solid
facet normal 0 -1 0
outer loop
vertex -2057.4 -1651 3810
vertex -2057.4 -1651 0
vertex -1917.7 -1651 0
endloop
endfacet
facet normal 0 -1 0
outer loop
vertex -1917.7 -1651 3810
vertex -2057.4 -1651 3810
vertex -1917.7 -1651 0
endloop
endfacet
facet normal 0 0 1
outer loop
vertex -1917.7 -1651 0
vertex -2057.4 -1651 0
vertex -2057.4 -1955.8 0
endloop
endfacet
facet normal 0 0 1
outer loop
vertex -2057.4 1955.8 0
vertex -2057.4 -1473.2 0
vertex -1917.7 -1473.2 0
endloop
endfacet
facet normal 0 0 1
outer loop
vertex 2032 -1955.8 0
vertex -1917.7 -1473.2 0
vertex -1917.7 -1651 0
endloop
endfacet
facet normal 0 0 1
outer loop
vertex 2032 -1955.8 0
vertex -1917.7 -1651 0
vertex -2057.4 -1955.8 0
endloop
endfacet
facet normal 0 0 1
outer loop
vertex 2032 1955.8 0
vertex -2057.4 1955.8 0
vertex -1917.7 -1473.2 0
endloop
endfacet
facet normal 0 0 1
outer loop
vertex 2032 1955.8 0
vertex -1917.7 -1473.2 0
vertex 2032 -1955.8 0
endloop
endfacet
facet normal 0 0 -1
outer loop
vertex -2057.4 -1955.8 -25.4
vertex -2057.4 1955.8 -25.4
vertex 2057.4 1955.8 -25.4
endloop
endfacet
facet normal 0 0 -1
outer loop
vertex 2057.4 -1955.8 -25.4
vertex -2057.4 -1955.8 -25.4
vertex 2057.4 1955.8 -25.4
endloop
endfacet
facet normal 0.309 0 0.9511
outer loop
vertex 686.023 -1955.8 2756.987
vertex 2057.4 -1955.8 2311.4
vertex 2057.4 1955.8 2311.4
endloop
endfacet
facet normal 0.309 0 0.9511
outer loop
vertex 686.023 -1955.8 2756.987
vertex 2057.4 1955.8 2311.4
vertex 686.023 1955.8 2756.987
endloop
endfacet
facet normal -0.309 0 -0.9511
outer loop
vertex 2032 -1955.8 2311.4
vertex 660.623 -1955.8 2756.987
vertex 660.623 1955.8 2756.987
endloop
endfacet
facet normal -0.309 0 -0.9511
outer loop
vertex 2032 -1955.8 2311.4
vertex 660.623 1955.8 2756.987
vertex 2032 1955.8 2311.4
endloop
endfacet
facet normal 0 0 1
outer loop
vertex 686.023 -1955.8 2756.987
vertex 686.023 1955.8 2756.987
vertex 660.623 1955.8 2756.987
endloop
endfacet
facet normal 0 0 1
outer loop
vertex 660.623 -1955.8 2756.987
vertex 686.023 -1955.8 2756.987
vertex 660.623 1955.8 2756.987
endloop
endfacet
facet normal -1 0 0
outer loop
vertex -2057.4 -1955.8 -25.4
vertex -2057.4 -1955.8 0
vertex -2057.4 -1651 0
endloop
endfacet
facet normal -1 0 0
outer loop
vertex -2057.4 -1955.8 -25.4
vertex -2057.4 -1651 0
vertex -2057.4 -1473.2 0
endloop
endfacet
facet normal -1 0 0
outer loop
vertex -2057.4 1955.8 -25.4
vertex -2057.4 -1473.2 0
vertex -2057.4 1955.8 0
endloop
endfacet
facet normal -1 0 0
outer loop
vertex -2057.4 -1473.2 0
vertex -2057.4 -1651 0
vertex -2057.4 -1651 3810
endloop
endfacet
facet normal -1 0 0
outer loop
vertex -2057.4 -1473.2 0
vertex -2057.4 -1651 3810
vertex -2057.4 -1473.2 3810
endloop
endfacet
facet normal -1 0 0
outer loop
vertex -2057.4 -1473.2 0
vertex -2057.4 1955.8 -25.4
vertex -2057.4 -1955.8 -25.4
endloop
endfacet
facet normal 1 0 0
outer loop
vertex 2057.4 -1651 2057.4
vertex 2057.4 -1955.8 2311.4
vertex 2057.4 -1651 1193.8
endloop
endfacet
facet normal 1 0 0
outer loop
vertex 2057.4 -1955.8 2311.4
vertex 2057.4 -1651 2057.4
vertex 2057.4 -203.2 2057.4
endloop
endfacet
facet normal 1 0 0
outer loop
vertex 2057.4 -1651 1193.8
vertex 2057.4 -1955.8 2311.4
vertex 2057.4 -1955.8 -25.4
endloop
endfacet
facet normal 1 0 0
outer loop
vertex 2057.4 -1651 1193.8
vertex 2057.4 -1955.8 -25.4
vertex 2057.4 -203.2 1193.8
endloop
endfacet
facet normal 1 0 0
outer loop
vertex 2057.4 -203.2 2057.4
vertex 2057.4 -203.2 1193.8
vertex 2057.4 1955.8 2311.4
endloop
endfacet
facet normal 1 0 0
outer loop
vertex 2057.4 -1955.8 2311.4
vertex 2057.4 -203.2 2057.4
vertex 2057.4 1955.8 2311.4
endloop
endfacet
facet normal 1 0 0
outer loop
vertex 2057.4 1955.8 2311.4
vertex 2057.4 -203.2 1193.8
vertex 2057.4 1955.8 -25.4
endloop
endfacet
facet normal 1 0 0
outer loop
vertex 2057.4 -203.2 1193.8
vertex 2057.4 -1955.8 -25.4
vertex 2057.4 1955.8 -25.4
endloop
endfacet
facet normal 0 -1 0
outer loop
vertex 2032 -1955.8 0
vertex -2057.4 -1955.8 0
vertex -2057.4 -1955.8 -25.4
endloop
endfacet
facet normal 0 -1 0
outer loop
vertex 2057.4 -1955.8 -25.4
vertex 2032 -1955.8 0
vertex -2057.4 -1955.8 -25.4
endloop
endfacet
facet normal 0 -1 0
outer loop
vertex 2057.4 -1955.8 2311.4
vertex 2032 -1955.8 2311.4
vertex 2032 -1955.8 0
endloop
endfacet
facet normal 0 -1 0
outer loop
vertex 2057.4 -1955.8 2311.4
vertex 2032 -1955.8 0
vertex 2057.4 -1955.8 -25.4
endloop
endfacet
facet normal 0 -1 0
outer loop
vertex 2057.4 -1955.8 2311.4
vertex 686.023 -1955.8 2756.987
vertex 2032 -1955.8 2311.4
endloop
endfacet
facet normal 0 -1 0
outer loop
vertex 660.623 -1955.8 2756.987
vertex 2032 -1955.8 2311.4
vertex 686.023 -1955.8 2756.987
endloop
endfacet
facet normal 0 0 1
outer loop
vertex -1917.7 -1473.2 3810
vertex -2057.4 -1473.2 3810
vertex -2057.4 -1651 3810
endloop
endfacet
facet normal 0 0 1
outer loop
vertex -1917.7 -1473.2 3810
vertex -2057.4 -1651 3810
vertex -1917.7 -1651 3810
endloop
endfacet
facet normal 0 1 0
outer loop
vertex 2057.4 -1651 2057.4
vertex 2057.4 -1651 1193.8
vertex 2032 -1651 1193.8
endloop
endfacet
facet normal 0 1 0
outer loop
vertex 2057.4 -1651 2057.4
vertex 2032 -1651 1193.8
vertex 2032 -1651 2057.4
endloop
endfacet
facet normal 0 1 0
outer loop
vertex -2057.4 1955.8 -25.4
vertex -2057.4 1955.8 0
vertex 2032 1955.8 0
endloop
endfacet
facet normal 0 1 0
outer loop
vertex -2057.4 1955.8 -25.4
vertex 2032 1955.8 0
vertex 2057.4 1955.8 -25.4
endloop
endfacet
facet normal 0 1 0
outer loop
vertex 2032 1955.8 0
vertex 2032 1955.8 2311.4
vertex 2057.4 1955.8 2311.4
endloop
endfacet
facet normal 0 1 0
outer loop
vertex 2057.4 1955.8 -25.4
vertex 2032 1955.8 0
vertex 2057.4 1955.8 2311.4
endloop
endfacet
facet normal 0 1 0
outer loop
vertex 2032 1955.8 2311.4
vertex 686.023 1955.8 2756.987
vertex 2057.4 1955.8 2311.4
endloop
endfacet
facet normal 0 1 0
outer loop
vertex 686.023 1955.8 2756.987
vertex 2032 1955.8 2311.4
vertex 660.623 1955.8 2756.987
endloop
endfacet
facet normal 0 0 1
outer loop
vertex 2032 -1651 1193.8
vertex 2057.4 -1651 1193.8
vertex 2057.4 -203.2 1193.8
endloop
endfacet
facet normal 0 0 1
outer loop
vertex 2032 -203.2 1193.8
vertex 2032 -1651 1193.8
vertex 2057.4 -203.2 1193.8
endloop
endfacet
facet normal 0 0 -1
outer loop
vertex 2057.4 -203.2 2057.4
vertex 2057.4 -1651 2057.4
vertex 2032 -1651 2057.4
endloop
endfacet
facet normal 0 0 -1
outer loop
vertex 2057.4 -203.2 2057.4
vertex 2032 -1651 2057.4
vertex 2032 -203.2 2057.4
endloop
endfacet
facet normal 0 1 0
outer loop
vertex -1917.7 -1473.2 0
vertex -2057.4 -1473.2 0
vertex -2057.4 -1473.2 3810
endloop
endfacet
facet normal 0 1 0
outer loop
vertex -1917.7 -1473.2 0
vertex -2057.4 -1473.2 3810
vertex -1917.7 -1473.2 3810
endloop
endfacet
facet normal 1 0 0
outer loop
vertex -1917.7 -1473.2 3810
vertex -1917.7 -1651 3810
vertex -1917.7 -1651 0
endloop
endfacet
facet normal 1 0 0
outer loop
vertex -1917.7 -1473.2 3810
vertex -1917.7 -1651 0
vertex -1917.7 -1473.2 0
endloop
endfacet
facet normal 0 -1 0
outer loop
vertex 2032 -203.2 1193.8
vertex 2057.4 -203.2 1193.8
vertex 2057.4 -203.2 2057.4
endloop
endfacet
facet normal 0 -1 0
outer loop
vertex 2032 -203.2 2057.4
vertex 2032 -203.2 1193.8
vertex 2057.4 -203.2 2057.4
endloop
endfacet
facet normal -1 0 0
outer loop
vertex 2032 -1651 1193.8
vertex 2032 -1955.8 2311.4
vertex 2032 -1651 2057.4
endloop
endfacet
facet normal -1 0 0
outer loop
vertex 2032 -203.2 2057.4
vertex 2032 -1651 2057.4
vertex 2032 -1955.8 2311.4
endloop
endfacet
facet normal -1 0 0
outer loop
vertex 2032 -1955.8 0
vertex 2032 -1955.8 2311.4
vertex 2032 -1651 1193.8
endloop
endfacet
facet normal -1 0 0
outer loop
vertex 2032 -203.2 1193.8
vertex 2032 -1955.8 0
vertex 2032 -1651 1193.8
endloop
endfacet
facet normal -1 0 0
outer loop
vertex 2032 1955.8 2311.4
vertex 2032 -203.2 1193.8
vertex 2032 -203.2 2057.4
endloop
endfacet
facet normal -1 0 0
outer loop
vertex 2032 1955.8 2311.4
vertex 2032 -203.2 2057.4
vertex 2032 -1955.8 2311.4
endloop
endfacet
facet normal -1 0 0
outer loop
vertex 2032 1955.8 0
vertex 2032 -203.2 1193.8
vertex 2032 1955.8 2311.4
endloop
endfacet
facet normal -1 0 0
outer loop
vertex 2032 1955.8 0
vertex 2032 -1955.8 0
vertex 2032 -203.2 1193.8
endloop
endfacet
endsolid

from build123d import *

# Parameters (mm, degrees)
F0_W     = 4114.8
F0_H     = 3911.6
F1_DEPTH = 25.4
F2_W     = 25.4
F2_H     = 3911.6
F3_DEPTH = 2311.4
F4_W     = 1447.8
F4_H     = 863.6
F5_DEPTH = 25.4
F6_W     = 139.7
F6_H     = 177.8
F7_DEPTH = 3810
F9_DEPTH = 3911.6


with BuildPart() as f1:
    # F0 (on Top) → F1 (new body)
    with BuildSketch(Plane.XY):
        Rectangle(F0_W, F0_H)
    extrude(amount=-F1_DEPTH)

    # F2 (on face) → F3 (join)
    with BuildSketch(Plane.XY):
        with Locations((2044.7, 0)):
            Rectangle(F2_W, F2_H)
    extrude(amount=F3_DEPTH)

    # F4 (on face) → F5 (cut)
    with BuildSketch(Plane.YZ.offset(2057.4)):
        with Locations((-927.1, 1625.6)):
            Rectangle(F4_W, F4_H)
    extrude(amount=-F5_DEPTH, mode=Mode.SUBTRACT)

    # F6 (on face) → F7 (join)
    with BuildSketch(Plane.XY):
        with Locations((-1987.55, -1562.1)):
            Rectangle(F6_W, F6_H)
    extrude(amount=F7_DEPTH)

    # F8 (on face) → F9 (join, through all)
    with BuildSketch(Plane.XZ.offset(1955.8)):
        Polygon((660.623378, 2756.987276), (2032, 2311.4), (2057.4, 2311.4), (686.023378, 2756.987276), align=None)
    extrude(amount=-F9_DEPTH)


solid = f1.part
